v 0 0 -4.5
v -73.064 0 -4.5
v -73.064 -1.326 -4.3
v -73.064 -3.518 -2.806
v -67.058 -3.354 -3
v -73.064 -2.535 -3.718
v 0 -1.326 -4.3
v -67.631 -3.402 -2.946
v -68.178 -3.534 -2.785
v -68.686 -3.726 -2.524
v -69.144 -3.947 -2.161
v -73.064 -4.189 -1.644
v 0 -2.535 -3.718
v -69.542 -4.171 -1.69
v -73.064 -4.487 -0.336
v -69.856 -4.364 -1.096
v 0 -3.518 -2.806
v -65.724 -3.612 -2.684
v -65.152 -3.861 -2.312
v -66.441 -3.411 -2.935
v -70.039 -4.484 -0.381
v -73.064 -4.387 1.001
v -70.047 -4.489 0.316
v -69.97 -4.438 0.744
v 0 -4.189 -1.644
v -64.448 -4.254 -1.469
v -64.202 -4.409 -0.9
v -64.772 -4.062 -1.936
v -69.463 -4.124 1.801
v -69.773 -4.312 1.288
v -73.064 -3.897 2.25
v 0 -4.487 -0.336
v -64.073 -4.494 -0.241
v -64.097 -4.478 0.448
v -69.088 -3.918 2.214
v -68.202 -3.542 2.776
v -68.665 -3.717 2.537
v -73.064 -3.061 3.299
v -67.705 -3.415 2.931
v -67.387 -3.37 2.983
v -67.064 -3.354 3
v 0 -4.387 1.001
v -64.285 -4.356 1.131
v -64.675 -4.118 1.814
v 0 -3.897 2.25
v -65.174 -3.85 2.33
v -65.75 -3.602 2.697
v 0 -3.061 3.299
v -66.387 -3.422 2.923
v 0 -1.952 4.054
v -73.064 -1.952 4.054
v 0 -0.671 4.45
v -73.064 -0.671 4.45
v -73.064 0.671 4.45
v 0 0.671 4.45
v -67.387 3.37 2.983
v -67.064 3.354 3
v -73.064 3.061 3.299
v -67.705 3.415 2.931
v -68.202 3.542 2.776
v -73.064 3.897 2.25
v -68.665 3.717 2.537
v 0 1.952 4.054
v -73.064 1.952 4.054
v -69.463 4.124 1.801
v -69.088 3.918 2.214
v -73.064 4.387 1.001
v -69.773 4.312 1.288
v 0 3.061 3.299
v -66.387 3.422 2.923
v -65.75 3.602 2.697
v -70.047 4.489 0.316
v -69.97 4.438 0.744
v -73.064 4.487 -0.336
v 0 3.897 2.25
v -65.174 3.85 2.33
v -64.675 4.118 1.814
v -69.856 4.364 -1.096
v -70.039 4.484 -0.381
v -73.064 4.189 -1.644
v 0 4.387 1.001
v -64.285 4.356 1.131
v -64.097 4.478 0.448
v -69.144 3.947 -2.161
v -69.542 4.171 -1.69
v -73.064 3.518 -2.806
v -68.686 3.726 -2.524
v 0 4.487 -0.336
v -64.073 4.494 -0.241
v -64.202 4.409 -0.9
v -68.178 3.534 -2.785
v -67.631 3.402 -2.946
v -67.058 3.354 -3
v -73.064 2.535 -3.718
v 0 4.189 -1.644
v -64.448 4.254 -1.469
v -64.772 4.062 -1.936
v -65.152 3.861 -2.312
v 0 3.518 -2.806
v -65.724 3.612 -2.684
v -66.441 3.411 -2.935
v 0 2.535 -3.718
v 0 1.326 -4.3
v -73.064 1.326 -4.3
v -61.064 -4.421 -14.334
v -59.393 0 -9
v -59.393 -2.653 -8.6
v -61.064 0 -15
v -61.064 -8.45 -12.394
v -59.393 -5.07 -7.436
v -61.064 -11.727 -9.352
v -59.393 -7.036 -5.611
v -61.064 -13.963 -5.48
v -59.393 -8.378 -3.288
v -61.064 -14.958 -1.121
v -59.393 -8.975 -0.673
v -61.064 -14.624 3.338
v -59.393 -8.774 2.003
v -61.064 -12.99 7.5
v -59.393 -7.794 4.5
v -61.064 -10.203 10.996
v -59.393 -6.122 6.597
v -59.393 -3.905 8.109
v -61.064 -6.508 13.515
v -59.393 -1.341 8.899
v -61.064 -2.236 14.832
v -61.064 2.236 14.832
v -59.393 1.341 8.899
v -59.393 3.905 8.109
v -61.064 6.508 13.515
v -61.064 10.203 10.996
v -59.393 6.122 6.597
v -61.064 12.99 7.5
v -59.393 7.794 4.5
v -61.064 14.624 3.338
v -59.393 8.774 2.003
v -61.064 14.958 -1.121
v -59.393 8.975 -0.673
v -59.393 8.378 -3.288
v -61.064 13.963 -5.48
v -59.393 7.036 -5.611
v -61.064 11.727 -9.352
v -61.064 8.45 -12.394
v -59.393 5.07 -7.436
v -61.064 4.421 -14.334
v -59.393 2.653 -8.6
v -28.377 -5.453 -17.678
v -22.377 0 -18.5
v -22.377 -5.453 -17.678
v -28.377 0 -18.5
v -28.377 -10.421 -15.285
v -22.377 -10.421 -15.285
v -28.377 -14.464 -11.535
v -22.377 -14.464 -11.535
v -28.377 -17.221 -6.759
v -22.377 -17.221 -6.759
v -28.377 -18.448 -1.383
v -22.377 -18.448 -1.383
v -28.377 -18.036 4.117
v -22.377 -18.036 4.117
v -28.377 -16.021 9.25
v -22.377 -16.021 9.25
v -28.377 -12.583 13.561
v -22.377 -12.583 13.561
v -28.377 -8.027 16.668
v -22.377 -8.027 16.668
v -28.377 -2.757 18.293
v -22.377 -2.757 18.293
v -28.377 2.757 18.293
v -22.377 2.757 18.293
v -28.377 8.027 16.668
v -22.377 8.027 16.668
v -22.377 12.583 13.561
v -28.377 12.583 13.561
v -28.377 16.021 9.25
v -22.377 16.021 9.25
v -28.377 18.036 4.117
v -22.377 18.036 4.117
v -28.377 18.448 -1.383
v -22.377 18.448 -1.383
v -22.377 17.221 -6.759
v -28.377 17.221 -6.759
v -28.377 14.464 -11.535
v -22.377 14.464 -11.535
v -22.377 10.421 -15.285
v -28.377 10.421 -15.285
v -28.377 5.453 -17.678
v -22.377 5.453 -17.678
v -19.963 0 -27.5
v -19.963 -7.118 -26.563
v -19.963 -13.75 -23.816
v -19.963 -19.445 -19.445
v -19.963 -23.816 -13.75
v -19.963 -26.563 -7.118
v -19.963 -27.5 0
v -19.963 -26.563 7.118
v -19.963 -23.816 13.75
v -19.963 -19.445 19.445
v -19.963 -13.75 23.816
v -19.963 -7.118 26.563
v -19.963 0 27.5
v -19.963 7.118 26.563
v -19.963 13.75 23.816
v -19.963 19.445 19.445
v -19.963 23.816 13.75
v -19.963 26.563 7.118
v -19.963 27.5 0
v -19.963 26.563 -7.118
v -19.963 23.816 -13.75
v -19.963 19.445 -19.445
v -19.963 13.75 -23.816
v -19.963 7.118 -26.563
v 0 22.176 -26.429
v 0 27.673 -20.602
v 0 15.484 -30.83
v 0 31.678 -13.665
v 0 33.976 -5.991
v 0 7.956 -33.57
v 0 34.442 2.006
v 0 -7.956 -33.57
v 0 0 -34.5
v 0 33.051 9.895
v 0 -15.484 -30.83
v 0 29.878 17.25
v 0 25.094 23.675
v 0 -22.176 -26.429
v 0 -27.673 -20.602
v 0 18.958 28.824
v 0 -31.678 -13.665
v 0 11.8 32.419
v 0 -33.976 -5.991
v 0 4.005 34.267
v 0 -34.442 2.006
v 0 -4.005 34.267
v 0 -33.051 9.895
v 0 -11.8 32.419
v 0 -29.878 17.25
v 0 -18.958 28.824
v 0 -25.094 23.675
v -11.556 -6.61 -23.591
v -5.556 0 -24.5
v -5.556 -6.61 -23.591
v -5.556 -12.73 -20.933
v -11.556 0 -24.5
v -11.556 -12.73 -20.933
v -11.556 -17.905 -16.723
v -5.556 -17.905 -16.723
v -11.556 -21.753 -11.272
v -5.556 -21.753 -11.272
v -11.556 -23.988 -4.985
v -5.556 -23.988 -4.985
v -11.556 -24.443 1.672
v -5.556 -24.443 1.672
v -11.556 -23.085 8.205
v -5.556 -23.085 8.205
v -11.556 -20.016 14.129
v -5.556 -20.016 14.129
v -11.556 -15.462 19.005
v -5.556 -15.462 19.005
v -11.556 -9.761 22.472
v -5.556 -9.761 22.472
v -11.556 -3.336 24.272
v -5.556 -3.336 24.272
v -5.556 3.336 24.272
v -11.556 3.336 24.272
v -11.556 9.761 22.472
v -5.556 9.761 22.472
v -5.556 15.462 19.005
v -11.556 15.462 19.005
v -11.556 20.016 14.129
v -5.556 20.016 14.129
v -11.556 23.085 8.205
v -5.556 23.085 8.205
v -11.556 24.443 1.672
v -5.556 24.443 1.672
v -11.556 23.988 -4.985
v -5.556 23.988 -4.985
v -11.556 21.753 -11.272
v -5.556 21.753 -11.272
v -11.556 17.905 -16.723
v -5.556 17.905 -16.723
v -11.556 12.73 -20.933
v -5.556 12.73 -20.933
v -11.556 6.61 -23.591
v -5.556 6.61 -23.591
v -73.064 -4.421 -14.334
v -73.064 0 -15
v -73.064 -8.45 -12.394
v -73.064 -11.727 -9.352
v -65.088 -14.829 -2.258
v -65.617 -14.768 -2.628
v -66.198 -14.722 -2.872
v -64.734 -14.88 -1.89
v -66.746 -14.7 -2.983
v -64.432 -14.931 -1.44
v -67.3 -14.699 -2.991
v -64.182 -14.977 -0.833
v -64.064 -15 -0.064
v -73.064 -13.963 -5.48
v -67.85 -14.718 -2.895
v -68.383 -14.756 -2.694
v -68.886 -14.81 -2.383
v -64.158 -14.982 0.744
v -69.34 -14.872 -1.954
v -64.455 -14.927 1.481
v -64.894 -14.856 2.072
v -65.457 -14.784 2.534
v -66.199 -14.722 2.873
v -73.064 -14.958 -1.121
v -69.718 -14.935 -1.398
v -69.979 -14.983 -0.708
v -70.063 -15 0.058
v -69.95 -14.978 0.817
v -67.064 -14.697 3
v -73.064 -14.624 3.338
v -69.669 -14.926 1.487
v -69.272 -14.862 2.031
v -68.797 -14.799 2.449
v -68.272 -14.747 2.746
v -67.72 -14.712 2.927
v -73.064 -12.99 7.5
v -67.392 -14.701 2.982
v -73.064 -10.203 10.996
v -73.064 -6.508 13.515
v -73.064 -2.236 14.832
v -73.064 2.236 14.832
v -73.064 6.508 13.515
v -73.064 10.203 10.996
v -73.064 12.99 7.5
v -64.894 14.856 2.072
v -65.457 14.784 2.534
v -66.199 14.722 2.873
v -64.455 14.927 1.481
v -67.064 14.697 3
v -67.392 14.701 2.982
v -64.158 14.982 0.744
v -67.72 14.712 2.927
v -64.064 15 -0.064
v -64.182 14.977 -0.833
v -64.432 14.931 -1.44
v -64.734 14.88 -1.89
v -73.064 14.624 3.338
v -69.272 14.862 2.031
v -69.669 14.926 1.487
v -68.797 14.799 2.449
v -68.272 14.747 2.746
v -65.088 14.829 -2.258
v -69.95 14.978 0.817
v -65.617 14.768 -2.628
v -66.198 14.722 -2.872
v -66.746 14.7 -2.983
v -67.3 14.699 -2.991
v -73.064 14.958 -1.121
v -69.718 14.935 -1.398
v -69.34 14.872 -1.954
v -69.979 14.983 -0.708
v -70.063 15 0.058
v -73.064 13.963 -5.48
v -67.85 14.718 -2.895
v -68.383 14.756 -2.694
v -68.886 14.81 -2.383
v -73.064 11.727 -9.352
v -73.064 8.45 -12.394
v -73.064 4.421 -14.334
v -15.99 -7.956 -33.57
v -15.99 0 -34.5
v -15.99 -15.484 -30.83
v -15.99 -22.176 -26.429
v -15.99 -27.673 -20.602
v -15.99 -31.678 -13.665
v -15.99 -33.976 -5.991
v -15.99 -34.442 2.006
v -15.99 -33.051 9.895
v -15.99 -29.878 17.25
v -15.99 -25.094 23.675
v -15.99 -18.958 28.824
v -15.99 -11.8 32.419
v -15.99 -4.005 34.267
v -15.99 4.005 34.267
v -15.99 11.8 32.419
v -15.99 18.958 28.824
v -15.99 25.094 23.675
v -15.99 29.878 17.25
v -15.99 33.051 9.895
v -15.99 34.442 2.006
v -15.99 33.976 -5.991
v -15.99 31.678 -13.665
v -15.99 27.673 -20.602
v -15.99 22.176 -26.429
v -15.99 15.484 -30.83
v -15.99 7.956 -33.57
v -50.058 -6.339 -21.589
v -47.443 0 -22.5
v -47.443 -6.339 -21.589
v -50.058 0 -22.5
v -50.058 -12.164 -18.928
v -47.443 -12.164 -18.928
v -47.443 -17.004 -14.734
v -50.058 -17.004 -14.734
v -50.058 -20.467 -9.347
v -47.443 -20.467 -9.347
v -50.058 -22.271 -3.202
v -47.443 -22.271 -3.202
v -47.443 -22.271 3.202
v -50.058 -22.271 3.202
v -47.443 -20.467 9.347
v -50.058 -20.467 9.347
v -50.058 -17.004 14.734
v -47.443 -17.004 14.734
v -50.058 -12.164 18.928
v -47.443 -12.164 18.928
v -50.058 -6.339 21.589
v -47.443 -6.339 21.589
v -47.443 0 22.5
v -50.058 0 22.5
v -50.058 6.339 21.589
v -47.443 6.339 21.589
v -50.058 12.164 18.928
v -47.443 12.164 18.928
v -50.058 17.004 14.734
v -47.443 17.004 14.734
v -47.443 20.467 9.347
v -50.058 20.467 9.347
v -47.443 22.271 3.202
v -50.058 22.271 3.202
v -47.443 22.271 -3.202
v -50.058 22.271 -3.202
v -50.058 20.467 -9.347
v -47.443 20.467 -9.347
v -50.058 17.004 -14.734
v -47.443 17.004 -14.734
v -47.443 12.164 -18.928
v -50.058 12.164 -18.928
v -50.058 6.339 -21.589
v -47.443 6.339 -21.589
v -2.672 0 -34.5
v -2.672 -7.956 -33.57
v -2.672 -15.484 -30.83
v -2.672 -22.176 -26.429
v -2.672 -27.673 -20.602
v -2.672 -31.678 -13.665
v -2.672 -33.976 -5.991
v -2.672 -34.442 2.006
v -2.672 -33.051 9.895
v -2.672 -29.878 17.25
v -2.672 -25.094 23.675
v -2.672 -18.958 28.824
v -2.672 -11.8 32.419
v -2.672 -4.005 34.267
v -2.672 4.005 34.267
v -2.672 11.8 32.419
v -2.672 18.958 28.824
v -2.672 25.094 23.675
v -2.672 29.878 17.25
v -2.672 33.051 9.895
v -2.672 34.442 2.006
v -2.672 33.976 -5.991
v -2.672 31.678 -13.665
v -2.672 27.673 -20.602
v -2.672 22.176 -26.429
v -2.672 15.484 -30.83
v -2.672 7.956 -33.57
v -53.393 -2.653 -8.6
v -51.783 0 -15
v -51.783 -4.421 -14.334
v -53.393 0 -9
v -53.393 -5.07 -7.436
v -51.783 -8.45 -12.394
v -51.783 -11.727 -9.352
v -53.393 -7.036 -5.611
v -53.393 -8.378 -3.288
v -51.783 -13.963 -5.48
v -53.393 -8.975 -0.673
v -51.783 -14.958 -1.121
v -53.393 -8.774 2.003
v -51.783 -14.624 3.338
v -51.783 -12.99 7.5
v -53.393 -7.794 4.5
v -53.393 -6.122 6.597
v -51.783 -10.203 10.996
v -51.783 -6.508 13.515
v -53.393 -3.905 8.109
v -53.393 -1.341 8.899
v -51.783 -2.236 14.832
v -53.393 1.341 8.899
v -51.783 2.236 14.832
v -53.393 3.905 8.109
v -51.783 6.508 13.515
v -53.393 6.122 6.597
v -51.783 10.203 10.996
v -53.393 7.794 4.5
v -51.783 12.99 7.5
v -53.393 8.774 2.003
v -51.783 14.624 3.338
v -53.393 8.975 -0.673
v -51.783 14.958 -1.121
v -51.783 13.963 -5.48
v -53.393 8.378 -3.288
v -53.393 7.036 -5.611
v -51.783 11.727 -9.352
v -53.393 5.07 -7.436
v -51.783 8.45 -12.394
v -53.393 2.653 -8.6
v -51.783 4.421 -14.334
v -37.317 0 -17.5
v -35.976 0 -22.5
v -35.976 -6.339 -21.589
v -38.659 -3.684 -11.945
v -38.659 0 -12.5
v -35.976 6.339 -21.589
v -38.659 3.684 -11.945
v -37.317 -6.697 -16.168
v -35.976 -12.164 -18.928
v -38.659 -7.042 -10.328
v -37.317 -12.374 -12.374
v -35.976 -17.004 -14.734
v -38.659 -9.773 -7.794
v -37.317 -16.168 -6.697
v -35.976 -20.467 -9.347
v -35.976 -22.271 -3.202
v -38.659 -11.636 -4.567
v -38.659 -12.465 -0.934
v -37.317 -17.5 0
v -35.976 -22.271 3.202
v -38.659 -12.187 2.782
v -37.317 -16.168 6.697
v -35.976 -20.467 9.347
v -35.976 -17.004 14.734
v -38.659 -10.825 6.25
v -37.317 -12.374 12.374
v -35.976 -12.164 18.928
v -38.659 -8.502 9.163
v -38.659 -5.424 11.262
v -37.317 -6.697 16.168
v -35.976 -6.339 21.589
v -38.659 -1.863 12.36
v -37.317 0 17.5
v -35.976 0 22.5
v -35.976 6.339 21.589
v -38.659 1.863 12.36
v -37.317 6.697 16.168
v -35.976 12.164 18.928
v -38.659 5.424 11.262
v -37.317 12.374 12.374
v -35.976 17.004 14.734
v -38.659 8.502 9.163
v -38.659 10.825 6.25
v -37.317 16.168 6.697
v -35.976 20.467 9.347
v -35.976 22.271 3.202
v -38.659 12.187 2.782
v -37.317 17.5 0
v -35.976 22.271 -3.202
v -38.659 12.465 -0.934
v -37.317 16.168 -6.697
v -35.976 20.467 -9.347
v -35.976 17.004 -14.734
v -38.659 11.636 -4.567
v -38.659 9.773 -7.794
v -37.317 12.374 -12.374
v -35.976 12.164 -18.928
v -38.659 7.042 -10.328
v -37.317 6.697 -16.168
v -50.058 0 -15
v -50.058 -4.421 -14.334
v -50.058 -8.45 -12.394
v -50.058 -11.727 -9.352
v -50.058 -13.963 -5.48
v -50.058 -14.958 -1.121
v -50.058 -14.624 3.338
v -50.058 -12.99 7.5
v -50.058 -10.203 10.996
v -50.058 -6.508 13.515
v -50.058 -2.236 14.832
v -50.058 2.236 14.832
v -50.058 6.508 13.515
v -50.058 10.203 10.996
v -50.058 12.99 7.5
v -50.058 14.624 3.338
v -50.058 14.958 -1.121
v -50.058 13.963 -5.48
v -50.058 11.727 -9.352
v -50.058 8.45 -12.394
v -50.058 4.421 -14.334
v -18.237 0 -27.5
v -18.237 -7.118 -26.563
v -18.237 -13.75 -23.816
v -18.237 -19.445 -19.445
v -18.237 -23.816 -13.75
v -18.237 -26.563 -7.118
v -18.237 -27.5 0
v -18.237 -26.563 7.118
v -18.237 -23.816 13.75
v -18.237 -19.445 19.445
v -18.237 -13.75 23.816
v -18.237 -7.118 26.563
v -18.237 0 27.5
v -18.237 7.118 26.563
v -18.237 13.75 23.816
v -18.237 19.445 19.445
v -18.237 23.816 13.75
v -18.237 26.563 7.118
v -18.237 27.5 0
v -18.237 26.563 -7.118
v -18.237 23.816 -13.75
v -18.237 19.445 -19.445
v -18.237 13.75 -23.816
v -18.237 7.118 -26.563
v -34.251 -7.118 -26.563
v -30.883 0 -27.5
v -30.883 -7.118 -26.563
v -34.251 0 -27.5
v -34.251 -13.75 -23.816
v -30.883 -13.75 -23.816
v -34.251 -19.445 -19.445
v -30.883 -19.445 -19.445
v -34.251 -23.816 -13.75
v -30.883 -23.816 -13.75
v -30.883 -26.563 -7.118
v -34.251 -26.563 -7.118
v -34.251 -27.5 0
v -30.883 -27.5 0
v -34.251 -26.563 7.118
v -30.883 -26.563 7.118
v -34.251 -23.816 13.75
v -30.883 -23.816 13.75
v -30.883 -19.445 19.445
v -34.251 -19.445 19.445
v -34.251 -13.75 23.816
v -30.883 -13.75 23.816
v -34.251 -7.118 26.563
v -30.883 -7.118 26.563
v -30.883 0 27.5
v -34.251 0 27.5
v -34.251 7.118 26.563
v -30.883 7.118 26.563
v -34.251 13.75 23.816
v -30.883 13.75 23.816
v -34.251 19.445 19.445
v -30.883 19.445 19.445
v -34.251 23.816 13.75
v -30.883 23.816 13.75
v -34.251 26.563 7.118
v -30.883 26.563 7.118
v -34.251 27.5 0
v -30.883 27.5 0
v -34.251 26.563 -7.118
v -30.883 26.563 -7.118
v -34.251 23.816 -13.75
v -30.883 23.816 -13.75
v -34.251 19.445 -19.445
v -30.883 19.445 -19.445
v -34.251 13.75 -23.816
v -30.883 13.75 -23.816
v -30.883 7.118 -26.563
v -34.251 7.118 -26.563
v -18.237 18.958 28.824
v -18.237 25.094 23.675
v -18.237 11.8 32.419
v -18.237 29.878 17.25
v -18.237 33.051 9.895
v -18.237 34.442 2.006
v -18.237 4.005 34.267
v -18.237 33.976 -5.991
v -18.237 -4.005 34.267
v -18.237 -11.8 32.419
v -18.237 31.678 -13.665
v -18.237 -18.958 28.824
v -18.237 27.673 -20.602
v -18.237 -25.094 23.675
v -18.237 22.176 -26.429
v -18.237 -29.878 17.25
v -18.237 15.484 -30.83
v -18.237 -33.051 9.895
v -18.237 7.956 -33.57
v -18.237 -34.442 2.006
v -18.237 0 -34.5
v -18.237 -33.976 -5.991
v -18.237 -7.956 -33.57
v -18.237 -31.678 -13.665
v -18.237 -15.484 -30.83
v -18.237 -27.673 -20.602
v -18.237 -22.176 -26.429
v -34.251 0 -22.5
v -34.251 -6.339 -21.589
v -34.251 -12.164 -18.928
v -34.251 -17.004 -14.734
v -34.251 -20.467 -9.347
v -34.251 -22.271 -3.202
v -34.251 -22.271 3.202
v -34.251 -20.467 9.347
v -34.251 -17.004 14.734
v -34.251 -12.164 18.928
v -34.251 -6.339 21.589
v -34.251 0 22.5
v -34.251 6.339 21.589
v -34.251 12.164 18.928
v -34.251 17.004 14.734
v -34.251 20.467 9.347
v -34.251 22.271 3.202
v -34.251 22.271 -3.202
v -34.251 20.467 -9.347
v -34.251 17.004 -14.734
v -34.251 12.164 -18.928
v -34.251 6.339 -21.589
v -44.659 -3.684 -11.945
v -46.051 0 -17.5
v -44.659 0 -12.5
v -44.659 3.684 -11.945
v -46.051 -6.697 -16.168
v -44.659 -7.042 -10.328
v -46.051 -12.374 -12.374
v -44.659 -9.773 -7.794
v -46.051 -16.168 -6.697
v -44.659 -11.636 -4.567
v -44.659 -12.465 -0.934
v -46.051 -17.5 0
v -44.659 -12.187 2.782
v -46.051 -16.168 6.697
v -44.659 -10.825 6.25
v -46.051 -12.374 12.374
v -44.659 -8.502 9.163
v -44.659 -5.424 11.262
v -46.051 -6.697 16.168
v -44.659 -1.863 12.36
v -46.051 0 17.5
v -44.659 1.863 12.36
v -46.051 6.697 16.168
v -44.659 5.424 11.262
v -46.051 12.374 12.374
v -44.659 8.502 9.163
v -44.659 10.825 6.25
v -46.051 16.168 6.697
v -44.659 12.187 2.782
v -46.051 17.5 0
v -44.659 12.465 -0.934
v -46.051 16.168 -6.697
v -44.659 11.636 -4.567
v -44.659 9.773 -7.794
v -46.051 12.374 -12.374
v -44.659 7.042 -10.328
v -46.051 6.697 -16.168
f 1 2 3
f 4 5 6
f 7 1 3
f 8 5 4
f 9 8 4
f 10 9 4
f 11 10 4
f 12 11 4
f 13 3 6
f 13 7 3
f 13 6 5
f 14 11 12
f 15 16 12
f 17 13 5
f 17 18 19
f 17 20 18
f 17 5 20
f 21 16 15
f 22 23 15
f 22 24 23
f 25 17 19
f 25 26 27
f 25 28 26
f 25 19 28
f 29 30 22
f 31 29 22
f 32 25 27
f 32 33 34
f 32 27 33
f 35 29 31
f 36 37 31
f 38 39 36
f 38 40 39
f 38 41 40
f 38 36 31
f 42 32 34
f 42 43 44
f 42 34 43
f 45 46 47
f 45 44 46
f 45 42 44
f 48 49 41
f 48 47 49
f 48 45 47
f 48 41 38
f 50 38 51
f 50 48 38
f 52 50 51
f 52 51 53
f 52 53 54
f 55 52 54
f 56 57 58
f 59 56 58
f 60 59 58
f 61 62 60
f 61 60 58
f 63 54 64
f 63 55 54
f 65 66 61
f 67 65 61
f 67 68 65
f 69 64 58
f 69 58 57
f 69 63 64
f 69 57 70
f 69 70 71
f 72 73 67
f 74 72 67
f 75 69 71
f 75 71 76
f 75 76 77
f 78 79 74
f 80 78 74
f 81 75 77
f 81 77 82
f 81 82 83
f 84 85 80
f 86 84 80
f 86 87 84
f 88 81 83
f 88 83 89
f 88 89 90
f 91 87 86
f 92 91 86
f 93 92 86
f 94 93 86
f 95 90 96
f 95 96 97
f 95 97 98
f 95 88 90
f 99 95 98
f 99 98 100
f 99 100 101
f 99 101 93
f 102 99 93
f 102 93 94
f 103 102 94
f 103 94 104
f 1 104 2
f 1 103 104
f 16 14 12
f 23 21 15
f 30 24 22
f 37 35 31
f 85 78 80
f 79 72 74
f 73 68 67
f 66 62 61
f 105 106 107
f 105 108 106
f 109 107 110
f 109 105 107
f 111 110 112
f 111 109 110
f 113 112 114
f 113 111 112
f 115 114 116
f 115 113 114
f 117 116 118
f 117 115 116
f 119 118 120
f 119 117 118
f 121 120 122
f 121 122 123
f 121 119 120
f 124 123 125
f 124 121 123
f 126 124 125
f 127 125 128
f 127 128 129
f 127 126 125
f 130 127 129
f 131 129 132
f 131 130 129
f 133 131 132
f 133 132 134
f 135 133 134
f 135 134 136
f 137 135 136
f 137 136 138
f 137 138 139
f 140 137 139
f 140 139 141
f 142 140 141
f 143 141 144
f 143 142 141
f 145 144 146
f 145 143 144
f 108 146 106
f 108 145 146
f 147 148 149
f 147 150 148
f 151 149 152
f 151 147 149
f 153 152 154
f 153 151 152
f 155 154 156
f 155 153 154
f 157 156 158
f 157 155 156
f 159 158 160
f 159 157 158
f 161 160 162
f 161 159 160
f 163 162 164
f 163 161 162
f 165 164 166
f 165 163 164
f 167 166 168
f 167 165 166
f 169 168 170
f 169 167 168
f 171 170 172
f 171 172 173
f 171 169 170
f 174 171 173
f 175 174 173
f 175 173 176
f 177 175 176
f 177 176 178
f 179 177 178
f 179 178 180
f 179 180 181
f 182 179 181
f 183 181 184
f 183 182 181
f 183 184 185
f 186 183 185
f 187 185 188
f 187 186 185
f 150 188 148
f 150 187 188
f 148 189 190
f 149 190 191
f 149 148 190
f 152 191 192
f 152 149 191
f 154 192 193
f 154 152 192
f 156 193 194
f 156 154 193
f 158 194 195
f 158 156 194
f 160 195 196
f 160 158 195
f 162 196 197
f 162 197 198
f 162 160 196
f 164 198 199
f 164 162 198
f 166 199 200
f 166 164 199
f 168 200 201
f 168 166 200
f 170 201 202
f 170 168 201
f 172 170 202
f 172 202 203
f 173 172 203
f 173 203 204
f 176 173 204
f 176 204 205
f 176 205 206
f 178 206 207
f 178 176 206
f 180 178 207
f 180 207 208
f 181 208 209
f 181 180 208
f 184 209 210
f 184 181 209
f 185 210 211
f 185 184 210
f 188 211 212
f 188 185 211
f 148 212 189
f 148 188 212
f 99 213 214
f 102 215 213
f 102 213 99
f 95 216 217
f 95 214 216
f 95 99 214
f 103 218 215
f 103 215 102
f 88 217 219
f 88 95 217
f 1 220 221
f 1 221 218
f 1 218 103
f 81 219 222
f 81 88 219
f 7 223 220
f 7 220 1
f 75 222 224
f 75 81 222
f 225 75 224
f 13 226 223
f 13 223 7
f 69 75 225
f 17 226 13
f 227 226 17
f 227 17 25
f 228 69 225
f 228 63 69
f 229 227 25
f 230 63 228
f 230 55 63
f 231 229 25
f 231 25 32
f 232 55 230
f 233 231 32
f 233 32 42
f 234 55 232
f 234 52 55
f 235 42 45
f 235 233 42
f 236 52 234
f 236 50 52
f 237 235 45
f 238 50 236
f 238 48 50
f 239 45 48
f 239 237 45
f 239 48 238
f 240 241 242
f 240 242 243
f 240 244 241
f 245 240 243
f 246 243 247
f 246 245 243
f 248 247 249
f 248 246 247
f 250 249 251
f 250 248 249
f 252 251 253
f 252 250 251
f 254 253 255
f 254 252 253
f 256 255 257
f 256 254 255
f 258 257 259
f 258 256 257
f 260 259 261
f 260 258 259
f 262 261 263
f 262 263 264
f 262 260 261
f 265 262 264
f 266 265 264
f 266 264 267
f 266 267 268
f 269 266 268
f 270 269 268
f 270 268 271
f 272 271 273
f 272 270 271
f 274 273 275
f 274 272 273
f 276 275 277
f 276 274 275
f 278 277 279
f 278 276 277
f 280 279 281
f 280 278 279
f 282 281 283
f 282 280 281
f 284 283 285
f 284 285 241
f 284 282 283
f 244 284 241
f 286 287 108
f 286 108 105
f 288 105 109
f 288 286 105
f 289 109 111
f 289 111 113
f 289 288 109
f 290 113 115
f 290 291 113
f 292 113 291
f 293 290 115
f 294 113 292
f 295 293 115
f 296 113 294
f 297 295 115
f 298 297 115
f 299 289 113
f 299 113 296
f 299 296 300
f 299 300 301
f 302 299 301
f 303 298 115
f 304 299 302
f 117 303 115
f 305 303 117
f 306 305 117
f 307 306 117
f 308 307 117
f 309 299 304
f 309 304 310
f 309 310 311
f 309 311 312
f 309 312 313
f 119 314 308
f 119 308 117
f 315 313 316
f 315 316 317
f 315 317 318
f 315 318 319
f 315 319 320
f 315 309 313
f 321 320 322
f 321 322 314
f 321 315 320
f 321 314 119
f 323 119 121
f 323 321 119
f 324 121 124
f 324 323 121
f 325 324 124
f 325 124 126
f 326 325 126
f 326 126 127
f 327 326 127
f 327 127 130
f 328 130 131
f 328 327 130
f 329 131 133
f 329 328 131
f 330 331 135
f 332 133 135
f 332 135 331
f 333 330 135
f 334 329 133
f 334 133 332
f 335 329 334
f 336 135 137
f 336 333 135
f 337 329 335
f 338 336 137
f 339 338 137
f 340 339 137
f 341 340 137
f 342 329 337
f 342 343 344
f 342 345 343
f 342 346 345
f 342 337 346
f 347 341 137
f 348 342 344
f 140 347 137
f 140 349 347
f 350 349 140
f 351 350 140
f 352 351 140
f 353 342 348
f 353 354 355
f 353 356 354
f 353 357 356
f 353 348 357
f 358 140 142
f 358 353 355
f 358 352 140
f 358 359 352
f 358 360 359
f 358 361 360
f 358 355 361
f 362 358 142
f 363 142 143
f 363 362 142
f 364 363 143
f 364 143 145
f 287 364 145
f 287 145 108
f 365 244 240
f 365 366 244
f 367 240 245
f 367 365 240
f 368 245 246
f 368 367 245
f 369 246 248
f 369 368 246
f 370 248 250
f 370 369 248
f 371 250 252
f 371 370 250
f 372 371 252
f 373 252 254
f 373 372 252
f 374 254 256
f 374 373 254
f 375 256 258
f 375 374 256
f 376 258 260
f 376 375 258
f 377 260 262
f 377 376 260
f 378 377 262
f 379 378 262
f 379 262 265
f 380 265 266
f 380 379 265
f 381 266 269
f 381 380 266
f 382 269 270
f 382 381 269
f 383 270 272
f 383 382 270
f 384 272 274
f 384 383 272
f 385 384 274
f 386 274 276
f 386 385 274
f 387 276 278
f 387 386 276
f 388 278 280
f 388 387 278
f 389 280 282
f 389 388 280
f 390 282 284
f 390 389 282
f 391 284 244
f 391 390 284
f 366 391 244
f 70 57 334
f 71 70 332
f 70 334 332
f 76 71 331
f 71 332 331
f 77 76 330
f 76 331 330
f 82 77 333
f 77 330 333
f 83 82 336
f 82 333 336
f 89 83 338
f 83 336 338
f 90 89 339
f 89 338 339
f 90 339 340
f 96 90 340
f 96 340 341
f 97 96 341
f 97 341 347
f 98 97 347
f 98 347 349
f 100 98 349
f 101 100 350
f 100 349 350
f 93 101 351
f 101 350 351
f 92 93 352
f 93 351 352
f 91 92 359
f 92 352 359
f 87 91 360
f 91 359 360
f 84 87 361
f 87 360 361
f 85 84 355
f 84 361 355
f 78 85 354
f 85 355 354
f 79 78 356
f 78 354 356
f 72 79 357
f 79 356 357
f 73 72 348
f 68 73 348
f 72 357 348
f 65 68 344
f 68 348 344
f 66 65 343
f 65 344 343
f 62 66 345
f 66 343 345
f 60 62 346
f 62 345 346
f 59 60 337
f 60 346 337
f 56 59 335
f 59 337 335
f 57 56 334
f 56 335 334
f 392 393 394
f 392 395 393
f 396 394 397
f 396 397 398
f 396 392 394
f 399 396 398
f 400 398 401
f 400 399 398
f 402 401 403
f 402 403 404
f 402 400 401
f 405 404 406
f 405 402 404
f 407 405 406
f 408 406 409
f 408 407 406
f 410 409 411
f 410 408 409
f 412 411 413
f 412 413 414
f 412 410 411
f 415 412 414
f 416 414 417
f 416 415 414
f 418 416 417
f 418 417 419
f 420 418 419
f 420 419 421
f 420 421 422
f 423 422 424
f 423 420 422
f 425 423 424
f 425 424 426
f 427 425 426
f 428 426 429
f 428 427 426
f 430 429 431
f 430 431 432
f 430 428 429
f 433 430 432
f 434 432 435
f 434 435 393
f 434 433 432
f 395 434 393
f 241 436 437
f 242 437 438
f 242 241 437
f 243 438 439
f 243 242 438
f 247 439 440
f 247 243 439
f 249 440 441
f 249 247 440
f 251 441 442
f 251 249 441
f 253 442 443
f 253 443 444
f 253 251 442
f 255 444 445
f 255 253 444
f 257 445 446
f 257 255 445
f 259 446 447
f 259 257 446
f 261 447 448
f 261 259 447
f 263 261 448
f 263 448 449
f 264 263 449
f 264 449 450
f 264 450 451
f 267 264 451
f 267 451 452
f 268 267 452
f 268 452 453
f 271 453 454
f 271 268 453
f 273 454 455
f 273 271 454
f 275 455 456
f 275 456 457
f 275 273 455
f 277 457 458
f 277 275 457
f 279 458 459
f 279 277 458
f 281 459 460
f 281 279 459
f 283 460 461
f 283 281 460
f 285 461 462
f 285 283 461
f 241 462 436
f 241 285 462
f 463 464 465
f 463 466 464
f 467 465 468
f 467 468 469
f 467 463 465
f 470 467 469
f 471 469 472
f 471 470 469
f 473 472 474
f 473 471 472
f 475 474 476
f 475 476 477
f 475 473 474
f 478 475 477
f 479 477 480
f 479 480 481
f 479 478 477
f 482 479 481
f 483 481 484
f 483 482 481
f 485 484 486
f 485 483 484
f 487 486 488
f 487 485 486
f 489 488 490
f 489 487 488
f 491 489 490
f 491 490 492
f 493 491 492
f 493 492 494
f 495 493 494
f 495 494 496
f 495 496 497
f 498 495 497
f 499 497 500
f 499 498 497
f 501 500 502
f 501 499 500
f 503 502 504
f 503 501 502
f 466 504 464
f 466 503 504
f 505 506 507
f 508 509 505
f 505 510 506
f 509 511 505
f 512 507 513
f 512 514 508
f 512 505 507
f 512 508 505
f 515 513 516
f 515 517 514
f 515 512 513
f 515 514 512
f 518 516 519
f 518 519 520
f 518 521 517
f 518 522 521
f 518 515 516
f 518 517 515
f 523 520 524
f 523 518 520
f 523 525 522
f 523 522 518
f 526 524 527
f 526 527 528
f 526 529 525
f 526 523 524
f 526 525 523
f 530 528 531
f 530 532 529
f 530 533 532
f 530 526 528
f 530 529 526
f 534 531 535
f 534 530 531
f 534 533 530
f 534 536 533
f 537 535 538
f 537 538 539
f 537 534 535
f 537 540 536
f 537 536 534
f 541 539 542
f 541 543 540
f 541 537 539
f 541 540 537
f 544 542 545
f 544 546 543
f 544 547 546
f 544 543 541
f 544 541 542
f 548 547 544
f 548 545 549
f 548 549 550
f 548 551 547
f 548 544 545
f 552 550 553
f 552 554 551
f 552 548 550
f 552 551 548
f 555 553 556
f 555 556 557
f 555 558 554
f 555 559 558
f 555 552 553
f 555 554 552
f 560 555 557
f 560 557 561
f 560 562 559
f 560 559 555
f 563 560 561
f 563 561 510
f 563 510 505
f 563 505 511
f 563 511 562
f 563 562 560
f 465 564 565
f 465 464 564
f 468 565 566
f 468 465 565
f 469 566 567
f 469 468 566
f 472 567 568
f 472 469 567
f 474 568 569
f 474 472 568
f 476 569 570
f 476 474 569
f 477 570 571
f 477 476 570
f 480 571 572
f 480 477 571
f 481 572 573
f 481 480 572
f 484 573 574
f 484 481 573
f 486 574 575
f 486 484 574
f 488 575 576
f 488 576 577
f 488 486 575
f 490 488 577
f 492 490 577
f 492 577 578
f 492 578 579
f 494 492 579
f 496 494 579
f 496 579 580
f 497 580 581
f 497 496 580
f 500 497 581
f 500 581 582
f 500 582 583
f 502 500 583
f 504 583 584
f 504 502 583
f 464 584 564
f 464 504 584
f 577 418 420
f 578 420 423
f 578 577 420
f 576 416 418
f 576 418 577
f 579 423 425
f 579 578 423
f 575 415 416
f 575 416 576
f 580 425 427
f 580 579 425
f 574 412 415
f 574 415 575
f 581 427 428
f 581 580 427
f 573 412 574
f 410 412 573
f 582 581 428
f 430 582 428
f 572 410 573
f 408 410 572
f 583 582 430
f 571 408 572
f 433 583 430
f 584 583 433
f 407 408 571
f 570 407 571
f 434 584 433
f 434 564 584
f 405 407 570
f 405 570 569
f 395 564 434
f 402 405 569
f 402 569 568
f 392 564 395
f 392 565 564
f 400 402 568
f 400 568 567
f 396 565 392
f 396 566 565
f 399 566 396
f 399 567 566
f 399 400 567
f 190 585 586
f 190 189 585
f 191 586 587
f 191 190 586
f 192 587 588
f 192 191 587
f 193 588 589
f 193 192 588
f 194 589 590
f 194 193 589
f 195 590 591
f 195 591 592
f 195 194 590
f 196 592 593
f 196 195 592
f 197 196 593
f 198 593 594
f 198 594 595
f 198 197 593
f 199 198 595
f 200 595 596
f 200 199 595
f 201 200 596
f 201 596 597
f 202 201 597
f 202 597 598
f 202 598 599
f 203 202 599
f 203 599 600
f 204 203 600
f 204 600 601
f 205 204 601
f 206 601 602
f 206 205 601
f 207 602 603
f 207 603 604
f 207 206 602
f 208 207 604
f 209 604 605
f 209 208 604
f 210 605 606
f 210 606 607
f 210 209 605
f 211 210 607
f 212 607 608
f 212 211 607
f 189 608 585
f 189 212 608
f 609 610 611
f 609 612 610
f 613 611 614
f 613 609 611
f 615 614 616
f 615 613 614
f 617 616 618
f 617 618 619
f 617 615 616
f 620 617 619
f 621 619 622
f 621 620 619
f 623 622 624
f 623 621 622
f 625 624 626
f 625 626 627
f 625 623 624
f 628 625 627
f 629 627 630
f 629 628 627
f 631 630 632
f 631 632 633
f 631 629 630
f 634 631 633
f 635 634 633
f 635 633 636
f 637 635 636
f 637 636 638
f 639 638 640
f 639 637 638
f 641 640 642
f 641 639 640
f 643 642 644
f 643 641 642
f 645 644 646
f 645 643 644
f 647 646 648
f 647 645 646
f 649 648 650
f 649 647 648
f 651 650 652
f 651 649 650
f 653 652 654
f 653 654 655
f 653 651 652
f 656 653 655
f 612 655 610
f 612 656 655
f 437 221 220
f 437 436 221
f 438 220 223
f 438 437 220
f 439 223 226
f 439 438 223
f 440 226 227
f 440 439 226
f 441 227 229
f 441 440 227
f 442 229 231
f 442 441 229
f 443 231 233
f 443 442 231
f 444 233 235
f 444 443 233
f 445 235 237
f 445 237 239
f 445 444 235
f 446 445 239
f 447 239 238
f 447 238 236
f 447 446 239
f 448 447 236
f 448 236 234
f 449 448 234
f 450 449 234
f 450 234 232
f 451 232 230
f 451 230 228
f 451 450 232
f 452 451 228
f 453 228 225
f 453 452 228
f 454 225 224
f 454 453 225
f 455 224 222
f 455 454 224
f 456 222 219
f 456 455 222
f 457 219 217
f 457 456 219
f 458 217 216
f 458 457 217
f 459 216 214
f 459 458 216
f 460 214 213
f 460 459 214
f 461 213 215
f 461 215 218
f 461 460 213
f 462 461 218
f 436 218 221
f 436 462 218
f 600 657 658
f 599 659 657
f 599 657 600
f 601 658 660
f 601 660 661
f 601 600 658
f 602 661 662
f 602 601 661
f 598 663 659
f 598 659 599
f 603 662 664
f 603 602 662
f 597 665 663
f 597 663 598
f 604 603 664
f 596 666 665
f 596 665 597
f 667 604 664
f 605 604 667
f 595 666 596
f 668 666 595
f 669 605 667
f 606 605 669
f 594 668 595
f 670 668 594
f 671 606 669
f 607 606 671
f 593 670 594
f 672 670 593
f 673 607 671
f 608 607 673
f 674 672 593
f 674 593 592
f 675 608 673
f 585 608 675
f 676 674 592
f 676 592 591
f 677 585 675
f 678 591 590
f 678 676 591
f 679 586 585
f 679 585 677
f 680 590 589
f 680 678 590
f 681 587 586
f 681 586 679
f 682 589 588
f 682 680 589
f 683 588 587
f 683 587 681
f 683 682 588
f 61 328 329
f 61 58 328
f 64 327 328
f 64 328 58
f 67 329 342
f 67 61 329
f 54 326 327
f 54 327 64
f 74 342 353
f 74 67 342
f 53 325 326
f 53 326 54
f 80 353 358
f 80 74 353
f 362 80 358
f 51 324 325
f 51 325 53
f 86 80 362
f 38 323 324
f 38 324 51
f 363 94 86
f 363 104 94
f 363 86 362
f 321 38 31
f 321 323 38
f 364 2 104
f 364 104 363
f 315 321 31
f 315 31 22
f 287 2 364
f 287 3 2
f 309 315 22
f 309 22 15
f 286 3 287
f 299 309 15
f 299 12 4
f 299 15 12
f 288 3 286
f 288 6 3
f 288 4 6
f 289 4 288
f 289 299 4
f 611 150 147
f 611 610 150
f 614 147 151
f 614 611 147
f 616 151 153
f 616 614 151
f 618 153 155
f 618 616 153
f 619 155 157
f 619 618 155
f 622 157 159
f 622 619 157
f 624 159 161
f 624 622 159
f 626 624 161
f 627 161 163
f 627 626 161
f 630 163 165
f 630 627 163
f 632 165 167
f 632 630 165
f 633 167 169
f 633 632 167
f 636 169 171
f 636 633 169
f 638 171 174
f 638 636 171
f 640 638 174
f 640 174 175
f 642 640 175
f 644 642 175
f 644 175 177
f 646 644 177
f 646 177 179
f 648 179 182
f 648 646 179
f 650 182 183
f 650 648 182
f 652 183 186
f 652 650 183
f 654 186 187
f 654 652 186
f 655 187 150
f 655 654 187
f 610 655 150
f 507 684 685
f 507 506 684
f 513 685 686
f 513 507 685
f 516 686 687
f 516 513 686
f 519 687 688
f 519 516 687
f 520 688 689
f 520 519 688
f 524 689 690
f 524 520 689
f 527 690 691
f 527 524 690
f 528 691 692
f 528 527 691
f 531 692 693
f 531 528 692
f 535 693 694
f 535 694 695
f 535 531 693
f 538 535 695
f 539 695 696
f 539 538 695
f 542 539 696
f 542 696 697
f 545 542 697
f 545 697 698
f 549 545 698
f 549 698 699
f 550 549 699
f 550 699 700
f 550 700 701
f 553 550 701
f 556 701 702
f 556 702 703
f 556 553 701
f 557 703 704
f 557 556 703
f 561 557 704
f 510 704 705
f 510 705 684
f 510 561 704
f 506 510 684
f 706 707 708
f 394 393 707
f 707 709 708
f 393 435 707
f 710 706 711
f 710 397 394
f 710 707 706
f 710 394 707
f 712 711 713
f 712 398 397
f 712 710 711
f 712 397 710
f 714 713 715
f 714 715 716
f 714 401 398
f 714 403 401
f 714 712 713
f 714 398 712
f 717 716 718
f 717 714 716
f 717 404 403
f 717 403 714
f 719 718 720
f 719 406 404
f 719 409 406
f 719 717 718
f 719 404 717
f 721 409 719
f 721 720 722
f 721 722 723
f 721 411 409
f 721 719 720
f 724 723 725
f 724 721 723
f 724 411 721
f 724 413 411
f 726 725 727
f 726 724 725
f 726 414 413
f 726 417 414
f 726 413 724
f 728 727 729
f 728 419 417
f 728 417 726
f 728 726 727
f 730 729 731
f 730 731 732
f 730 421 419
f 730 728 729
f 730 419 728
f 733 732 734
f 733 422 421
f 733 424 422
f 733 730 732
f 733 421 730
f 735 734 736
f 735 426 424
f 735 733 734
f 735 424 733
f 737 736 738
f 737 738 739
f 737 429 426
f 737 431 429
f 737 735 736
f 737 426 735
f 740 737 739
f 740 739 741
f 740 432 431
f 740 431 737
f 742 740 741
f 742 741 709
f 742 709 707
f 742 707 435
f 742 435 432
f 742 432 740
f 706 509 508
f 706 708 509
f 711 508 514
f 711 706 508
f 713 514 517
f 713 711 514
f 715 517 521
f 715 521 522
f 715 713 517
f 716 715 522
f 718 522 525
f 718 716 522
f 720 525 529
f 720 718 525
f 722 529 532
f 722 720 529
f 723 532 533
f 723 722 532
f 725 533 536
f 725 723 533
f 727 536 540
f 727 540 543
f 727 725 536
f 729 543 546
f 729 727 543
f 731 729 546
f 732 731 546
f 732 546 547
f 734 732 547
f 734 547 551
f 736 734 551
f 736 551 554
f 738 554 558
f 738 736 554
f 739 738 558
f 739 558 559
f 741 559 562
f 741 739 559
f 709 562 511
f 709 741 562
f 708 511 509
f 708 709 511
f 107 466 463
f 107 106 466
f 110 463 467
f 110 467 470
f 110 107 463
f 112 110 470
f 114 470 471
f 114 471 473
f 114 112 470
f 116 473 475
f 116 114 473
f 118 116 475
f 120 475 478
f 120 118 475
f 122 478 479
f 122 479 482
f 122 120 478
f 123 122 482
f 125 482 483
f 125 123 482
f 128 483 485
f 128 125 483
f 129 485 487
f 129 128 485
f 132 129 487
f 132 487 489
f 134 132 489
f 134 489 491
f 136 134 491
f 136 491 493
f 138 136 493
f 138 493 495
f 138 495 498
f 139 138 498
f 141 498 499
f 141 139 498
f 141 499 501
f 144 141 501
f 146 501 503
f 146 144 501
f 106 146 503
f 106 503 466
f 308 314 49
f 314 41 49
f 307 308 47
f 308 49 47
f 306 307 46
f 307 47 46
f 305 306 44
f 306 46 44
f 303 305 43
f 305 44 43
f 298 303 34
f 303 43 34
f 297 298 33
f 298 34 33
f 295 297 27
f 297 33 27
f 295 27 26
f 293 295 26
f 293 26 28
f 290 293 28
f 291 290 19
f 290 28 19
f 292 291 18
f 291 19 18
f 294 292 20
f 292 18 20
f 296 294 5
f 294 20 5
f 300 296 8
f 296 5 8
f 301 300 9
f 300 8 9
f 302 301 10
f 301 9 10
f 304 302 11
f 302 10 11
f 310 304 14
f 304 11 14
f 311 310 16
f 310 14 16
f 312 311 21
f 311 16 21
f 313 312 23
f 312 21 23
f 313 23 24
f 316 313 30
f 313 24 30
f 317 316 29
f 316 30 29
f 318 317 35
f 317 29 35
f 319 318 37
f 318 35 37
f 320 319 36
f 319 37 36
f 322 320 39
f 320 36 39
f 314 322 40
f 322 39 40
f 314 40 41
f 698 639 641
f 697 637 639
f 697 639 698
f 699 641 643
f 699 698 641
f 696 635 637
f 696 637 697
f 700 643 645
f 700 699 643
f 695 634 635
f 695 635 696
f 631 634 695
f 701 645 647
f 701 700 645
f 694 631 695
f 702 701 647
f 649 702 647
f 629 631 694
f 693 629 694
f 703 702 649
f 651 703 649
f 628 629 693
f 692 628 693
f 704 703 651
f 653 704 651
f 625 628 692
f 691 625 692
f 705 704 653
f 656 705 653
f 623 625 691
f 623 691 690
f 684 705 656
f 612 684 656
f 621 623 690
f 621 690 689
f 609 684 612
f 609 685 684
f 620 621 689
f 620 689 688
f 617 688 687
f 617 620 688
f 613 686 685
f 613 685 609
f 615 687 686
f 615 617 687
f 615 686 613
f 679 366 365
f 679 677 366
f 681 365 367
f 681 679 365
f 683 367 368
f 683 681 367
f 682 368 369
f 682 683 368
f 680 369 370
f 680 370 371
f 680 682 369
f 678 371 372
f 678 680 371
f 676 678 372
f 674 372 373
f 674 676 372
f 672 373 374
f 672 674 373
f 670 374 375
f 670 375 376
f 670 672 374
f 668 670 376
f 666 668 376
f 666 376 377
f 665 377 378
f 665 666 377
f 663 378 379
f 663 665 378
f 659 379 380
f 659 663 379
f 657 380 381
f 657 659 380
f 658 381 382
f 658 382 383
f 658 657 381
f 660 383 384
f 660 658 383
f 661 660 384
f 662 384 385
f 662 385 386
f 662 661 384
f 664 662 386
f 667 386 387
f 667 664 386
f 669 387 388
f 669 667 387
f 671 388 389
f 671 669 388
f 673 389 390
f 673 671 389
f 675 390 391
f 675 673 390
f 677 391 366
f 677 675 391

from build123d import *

# Parameters (mm, degrees)
SKETCH2_R          = 3
CUT_EXTRUDE1_DEPTH = 23.5


with BuildPart() as part:
    # Sketch1 → Revolve1 (revolve)
    with BuildSketch(Plane.XY, mode=Mode.PRIVATE) as revolve1_sk:
        Polygon((-73.063744965, 4.5), (0, 4.5), (0, 34.5), (-2.67228246, 34.5), (-5.556499615, 24.5), (-11.556499615, 24.5), (-15.990247298, 34.5), (-18.237315581, 34.5), (-18.237315581, 27.5), (-19.962759183, 27.5), (-22.377341153, 18.5), (-28.377341153, 18.5), (-30.883350481, 27.5), (-34.250598113, 27.5), (-34.250598113, 22.5), (-35.976041715, 22.5), (-38.65891057, 12.5), (-44.65891057, 12.5), (-47.443365379, 22.5), (-50.057907164, 22.5), (-50.057907164, 15), (-51.783350766, 15), (-53.393072079, 9), (-59.393072079, 9), (-61.063744965, 15), (-73.063744965, 15), align=None)
    revolve(revolve1_sk.sketch.rotate(Axis((0, 0, 0), (-1, 0, 0)), 90), axis=Axis((0, 0, 0), (-1, 0, 0)))

    # Sketch2 → Cut-Extrude1 (cut, symmetric)
    with BuildSketch(Plane(origin=(0, 0, 0), x_dir=(1, 0, 0), z_dir=(0, 1, 0))):
        with Locations(Location((-67.063744965, 0, 0), (0, 0, 270))):
            Circle(SKETCH2_R)
    extrude(amount=CUT_EXTRUDE1_DEPTH, both=True, mode=Mode.SUBTRACT)


solid = part.part
